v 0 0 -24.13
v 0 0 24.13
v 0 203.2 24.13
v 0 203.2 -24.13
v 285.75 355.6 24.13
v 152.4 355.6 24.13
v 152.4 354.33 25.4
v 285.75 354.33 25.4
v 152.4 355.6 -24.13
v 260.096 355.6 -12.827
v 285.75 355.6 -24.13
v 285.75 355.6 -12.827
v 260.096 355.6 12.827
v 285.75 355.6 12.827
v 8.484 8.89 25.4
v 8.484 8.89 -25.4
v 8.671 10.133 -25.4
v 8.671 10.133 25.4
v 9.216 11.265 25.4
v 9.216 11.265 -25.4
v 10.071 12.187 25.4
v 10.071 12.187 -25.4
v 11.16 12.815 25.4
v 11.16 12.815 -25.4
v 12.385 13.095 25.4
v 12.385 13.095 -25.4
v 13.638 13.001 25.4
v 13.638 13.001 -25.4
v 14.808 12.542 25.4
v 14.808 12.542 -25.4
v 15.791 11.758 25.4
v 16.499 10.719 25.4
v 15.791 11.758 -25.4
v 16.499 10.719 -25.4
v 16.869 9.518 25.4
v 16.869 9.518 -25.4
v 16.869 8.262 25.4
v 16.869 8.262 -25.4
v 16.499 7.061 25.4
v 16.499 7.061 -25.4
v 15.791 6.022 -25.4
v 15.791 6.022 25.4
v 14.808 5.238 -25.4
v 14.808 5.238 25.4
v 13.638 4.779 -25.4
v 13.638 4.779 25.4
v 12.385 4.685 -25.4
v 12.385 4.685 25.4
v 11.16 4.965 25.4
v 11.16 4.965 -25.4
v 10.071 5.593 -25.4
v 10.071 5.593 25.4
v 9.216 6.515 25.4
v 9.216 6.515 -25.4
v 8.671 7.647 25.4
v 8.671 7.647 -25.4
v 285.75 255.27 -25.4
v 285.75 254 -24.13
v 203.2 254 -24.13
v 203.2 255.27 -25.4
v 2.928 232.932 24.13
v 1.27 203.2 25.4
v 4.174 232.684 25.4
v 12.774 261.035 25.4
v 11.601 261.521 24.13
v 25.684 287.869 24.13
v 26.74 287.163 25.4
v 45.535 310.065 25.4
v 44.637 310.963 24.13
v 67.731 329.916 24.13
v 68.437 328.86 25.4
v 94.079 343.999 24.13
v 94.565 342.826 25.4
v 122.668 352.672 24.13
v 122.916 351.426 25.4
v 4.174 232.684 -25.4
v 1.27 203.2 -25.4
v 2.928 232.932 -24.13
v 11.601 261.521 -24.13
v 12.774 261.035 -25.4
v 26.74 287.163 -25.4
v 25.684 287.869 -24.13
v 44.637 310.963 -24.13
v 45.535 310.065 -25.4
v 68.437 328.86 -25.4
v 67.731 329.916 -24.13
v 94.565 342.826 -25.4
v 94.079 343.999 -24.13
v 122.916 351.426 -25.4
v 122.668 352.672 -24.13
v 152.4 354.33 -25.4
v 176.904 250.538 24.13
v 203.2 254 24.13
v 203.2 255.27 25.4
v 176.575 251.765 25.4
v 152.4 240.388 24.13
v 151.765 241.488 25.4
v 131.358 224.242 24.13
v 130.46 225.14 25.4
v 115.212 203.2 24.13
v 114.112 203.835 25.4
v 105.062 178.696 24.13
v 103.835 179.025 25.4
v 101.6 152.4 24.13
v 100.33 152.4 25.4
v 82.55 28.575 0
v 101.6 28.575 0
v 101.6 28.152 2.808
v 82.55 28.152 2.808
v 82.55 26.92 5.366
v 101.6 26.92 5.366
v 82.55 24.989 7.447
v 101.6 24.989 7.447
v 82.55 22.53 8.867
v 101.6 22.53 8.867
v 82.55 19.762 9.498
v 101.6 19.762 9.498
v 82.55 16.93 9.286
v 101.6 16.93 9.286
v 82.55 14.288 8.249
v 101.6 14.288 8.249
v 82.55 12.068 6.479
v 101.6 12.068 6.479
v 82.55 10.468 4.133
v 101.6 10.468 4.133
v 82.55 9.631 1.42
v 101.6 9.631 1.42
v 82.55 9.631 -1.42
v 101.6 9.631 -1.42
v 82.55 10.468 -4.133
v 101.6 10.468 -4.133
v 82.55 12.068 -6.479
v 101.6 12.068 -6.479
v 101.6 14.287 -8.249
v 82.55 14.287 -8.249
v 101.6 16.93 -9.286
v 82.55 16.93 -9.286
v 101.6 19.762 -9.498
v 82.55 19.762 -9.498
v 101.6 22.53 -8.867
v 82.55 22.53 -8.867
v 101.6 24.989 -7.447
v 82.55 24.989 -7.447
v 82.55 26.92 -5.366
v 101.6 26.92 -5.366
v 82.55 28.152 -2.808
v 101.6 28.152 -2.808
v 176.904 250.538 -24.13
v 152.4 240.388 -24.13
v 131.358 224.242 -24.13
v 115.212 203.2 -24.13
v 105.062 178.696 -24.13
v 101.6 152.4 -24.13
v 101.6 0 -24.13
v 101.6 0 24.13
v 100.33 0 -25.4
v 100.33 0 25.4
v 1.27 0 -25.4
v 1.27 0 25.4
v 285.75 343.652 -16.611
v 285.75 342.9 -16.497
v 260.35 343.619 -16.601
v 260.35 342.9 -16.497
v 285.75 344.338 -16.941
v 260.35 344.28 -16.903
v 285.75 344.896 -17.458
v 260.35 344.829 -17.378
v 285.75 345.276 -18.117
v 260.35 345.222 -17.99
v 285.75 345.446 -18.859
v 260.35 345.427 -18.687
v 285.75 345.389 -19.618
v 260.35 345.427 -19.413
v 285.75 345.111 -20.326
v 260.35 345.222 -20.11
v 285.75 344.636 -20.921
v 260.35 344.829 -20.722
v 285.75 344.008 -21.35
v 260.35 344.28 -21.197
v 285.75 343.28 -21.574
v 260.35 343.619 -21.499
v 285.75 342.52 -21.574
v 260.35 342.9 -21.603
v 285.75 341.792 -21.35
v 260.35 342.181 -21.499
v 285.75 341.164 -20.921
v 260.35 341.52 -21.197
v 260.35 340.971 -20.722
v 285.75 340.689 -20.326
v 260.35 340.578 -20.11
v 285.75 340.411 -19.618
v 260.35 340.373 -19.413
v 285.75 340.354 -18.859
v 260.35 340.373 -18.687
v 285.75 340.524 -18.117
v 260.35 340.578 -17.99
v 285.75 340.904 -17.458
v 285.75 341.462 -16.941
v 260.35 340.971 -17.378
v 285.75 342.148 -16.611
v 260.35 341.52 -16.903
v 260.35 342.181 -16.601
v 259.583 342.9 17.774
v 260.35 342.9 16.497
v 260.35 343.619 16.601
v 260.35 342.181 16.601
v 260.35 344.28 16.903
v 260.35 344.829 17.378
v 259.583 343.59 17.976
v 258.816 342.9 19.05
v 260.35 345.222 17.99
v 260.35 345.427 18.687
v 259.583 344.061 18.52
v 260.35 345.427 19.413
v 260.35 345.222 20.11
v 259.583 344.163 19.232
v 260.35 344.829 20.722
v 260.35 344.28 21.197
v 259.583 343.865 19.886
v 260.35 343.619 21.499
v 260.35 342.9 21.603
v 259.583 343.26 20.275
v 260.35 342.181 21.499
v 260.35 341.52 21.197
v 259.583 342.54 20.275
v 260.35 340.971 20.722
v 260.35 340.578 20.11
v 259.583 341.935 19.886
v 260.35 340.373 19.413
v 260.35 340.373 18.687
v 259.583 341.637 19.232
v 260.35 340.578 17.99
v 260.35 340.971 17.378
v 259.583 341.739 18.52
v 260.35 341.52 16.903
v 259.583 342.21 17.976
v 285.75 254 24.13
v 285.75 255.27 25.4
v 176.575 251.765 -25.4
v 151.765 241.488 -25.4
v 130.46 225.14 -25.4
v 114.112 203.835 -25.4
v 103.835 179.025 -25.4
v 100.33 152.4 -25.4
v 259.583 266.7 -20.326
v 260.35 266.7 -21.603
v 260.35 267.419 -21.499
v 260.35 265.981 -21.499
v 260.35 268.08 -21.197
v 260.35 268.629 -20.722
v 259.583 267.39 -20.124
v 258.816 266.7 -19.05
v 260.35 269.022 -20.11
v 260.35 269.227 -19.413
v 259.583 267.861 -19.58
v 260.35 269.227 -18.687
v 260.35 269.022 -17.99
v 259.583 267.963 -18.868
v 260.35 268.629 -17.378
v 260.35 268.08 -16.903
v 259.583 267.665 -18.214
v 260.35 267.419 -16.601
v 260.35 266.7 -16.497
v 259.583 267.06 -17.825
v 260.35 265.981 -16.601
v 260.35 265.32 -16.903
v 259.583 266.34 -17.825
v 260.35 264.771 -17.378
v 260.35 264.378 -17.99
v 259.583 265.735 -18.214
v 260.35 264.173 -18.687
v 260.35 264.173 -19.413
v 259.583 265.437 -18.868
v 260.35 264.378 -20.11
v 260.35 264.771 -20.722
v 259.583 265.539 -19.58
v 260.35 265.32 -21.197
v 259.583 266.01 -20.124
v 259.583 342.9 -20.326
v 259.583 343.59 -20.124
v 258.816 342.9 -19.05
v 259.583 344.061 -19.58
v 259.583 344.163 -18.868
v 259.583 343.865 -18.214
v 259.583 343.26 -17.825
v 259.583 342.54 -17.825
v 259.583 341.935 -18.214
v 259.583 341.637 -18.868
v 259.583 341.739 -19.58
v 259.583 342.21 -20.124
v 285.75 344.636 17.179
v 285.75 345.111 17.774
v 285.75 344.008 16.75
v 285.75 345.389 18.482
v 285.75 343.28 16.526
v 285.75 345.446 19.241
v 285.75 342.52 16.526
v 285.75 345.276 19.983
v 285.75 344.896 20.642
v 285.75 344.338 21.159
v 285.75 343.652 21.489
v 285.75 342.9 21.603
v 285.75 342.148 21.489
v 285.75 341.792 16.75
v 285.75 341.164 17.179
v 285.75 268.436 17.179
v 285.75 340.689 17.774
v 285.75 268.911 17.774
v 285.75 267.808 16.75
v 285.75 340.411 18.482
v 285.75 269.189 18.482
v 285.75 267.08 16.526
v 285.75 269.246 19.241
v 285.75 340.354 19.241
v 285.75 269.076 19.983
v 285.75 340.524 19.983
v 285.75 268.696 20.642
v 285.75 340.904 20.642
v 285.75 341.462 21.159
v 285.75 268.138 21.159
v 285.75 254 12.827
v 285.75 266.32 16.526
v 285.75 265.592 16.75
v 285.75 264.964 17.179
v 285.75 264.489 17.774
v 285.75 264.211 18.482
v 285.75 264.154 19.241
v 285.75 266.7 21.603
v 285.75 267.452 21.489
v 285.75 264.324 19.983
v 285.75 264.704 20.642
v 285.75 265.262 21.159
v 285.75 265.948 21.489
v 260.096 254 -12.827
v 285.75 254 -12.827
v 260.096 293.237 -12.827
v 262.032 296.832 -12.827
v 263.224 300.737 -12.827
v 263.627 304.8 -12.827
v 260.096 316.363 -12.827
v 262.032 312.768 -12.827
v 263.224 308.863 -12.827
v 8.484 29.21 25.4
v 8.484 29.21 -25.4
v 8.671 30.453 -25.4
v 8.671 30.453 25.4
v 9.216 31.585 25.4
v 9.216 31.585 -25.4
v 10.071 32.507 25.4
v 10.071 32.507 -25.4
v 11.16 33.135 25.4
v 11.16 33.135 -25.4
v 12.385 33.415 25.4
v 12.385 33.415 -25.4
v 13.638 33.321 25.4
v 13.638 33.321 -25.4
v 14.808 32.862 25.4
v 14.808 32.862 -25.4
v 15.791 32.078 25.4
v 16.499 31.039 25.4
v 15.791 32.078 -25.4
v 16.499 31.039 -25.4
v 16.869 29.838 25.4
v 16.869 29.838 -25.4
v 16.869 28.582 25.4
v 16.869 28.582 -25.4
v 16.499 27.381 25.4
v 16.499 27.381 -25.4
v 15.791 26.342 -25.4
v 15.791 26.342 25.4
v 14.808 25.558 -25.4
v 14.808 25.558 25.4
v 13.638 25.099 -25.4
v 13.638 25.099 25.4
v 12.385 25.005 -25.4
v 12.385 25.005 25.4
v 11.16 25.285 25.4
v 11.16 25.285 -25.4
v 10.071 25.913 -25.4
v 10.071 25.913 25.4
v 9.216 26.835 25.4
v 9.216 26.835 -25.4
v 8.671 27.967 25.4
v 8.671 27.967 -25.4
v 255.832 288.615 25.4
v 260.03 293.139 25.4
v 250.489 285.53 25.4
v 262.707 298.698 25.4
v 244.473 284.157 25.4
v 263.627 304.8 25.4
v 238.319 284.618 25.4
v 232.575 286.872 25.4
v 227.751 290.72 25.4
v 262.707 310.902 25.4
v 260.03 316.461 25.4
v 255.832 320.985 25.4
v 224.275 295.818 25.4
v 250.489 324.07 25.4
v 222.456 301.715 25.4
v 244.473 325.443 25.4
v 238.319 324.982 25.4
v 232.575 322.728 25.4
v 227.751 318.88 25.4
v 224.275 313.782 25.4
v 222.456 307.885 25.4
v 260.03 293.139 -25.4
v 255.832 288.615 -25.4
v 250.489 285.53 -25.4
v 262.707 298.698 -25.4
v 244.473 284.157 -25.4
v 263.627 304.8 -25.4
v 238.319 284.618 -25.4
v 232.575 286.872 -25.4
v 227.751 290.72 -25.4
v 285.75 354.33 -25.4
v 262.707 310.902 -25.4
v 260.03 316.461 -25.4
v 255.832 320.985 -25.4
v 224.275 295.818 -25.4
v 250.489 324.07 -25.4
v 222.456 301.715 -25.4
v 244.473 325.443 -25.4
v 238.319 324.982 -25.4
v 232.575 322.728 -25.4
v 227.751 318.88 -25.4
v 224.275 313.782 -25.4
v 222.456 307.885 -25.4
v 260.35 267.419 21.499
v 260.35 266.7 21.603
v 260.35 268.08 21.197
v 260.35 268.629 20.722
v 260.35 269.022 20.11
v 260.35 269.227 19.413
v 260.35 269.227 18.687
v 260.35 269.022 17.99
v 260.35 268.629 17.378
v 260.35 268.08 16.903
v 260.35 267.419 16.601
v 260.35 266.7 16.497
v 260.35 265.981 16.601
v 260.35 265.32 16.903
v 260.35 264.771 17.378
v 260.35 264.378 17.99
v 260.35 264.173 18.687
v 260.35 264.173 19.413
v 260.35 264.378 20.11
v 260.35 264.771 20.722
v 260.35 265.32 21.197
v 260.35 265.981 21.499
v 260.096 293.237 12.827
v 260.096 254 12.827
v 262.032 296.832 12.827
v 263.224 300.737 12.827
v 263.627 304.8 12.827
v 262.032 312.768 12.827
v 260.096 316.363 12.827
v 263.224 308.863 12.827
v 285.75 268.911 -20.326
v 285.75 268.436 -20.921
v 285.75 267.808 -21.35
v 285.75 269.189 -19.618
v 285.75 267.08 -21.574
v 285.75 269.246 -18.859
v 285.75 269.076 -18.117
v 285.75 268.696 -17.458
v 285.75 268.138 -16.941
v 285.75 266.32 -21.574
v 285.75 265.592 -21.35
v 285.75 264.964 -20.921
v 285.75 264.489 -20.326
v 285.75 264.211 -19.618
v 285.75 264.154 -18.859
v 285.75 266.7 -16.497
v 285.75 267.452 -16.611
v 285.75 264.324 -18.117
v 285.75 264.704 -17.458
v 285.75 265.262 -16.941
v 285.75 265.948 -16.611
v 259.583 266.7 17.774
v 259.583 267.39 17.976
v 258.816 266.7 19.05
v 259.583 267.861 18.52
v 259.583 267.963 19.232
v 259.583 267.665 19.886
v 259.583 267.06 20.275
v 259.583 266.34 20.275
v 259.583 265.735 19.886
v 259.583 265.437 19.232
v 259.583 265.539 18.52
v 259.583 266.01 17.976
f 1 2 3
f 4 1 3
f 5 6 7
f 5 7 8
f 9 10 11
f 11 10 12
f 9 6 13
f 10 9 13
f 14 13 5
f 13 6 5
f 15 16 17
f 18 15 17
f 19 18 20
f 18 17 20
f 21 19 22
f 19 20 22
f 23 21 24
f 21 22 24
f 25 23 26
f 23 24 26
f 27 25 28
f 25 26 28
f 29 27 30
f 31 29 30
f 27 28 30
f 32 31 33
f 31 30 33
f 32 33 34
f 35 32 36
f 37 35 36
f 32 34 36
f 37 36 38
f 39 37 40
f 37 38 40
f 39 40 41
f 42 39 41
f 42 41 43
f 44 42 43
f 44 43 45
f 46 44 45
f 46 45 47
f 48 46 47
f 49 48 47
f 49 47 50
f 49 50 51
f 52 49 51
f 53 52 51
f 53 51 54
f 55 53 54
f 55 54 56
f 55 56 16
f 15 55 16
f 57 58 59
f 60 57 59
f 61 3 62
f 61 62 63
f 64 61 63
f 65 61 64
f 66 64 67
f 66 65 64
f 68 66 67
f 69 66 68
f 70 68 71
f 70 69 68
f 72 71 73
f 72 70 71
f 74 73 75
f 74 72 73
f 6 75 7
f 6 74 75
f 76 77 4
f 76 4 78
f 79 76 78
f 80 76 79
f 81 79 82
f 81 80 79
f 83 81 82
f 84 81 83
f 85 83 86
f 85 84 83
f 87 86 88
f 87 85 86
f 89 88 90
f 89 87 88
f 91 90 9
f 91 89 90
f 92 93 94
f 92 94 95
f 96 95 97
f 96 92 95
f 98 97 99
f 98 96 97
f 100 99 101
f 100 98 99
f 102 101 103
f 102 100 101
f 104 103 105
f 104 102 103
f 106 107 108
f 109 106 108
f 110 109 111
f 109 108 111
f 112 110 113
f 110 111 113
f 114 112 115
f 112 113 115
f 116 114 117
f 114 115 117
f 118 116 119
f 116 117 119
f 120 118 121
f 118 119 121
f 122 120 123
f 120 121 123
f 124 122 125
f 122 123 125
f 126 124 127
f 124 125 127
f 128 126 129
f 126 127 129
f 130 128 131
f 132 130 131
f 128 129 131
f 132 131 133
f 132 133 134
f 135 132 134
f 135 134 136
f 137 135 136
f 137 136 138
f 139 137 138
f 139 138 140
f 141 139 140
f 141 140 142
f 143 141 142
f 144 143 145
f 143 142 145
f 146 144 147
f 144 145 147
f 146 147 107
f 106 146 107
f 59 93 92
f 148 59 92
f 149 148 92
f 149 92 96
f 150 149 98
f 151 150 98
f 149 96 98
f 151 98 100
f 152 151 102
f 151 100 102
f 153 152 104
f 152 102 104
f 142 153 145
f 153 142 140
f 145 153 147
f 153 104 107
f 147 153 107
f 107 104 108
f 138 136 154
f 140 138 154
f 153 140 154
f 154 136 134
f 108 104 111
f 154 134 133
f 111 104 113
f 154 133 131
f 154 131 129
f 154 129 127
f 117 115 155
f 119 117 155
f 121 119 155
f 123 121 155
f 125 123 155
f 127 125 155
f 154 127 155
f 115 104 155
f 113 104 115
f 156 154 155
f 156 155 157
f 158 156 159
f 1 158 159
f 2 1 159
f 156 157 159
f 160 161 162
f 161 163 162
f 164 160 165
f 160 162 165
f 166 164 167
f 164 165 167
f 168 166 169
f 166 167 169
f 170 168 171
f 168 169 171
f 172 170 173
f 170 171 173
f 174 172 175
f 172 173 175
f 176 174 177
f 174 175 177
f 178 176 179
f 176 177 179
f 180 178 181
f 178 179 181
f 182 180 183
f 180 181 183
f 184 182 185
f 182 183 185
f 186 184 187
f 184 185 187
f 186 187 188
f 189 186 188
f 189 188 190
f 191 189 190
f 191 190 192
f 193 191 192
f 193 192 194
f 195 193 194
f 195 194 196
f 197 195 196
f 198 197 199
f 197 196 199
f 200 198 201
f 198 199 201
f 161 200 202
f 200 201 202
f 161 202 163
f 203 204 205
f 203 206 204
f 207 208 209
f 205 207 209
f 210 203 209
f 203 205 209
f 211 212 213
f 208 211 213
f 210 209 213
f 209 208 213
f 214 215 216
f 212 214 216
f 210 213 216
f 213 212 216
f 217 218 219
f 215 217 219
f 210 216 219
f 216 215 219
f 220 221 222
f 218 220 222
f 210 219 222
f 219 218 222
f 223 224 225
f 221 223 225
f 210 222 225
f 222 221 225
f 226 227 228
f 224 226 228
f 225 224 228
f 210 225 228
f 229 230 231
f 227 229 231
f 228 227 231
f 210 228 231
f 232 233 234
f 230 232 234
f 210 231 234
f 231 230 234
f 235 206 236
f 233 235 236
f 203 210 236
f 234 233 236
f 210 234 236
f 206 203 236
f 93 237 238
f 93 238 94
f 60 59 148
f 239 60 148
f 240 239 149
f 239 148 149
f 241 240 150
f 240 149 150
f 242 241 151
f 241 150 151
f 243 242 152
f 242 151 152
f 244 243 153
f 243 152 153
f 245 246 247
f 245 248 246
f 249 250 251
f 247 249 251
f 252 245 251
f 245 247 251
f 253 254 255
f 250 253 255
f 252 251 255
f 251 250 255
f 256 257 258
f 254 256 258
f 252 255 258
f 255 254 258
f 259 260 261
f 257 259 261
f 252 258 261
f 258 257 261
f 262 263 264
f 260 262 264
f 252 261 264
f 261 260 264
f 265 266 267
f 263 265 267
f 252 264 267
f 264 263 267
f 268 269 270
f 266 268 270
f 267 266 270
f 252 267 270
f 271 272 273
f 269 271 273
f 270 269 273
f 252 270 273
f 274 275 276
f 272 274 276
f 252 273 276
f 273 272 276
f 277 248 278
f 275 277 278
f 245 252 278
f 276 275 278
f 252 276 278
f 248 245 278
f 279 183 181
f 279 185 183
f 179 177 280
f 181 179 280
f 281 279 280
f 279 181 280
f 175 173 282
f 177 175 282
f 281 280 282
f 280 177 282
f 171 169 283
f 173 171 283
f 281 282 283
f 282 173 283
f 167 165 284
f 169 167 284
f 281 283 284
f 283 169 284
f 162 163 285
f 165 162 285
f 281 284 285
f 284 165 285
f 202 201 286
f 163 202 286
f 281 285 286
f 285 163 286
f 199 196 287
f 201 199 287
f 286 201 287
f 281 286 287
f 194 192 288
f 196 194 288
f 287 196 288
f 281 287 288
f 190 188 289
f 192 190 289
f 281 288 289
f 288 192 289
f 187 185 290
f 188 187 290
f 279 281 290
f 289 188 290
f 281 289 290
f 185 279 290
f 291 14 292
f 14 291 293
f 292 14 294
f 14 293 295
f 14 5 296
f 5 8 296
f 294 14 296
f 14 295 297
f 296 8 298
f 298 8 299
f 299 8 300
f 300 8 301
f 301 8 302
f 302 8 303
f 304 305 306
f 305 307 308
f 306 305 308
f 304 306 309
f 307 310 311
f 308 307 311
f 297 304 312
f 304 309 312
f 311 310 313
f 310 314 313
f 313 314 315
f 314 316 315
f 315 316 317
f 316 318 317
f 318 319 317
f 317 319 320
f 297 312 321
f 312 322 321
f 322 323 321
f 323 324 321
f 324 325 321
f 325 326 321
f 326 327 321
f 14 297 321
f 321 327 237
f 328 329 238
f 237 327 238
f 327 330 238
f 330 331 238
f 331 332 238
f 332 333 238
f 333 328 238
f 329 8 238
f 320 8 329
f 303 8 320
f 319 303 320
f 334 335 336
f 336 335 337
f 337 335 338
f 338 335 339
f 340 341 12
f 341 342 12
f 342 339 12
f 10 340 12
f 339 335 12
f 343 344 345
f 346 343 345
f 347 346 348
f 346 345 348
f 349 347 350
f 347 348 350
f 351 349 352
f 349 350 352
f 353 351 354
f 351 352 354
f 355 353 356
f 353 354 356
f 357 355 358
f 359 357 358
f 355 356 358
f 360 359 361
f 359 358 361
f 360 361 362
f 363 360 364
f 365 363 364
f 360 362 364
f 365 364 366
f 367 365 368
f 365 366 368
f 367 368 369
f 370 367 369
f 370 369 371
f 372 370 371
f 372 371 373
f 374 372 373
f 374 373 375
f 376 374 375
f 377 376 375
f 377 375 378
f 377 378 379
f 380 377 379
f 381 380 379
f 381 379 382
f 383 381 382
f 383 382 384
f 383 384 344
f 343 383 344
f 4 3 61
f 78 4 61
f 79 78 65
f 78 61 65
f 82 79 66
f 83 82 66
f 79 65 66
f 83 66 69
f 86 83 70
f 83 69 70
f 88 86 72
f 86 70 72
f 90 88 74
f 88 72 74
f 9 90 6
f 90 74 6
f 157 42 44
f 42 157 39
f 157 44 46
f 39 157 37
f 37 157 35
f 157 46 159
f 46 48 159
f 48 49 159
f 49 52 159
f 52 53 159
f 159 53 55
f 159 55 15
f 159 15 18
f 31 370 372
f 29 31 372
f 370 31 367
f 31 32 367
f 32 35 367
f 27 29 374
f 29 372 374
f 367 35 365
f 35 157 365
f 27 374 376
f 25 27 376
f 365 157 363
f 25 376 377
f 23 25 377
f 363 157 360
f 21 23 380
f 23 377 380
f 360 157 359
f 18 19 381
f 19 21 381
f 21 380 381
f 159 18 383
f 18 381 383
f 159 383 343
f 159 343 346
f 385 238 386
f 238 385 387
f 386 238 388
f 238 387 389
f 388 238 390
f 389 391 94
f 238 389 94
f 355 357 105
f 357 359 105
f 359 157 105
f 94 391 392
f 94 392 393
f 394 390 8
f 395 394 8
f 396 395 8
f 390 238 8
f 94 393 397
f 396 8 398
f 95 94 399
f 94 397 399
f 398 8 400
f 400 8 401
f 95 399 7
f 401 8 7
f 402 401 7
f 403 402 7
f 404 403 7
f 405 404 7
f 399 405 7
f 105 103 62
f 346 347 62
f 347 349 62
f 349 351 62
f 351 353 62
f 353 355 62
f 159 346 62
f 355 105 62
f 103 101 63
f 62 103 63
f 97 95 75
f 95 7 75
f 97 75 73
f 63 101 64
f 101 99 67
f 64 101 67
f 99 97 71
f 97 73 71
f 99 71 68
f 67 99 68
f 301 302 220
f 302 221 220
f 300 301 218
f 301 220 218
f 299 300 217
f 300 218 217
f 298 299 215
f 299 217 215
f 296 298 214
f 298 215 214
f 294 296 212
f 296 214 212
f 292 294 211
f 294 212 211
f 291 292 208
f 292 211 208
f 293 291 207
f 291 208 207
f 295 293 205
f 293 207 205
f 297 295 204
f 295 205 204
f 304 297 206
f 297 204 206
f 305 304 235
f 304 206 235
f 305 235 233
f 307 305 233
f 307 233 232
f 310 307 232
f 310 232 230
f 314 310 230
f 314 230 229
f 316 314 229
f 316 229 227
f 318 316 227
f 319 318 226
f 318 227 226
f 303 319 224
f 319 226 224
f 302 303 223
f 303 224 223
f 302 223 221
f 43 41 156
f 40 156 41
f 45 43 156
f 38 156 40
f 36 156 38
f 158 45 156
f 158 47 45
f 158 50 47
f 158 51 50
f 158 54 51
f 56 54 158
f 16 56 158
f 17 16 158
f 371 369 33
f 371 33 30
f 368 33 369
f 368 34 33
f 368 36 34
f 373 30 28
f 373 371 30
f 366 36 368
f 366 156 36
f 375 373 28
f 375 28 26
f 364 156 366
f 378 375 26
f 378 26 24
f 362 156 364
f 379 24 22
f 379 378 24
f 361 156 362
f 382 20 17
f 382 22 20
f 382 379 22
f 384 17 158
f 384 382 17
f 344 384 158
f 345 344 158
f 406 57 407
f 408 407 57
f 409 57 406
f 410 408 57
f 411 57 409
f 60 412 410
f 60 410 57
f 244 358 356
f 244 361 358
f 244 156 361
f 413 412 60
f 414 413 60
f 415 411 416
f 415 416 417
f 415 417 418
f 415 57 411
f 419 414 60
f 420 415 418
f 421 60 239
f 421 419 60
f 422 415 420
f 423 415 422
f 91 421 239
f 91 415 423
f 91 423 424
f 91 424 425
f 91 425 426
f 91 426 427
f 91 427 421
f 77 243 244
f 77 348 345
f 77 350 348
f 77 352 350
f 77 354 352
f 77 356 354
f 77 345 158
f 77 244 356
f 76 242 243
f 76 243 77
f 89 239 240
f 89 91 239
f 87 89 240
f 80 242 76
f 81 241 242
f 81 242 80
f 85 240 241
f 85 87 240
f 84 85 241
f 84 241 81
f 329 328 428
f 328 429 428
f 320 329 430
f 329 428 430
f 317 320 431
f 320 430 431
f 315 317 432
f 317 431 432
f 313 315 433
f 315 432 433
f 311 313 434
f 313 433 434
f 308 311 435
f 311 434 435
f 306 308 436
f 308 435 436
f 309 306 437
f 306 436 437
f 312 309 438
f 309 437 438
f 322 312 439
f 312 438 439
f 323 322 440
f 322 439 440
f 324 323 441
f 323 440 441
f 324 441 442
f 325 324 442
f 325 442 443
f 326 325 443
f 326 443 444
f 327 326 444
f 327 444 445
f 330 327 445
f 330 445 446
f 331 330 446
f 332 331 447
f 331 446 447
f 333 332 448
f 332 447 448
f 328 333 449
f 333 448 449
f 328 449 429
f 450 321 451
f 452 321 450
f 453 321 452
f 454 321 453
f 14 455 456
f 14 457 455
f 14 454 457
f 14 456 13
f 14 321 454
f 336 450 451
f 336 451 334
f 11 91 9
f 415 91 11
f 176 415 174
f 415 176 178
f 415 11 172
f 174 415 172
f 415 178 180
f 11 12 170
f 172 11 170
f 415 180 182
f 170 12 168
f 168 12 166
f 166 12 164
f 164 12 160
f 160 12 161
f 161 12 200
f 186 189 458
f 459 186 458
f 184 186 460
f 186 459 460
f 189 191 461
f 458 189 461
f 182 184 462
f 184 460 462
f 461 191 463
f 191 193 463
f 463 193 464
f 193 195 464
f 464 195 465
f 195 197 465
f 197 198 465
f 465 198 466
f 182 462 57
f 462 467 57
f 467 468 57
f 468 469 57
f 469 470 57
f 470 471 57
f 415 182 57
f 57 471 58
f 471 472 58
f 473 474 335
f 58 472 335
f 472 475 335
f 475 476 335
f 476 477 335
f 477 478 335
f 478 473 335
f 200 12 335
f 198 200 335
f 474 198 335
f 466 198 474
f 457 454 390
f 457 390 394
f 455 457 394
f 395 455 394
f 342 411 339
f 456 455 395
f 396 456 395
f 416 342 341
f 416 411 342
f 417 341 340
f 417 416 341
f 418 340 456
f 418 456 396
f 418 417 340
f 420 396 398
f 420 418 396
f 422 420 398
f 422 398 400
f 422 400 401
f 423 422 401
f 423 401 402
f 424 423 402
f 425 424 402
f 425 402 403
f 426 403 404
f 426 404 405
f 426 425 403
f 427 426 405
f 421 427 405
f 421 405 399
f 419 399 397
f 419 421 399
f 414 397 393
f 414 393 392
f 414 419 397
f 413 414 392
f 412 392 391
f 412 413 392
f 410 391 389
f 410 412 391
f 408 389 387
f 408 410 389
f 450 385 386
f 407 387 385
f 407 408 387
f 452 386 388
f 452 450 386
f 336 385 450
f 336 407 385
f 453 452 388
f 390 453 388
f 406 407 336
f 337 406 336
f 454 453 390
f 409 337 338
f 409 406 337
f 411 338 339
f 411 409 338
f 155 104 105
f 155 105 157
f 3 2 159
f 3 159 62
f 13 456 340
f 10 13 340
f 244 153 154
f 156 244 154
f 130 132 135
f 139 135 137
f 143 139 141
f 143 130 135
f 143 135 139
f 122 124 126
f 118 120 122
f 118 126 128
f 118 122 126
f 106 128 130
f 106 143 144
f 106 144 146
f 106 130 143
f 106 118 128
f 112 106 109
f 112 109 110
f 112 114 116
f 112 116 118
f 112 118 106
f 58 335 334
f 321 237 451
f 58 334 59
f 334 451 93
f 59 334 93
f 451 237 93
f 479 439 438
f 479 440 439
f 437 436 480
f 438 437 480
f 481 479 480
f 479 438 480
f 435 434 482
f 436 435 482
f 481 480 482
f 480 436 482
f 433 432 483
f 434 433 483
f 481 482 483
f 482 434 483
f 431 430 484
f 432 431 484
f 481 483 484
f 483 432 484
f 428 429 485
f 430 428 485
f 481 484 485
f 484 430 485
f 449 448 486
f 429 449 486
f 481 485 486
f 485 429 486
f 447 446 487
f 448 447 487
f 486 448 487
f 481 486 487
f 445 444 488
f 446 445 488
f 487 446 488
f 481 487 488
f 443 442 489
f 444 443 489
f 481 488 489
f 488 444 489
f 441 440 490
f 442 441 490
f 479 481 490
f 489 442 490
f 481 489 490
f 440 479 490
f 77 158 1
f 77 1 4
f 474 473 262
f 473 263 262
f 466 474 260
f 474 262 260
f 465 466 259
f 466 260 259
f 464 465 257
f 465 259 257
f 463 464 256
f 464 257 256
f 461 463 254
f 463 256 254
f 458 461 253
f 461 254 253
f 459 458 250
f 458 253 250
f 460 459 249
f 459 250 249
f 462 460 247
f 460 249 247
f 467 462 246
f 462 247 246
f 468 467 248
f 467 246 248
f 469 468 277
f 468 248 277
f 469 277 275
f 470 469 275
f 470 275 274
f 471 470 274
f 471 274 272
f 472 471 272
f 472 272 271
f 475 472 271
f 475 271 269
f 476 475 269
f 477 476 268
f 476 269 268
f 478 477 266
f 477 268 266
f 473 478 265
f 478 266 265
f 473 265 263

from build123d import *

# Parameters (mm, degrees)
SKETCH1_R                   = 20.701
BOSS_EXTRUDE1_DEPTH         = 25.4
SKETCH2_W                   = 25.654
SKETCH2_H                   = 101.6
CUT_EXTRUDE1_DEPTH          = 25.654
F_1_4_20_TAPPED_HOLE1_D     = 5.1054
F_1_4_20_TAPPED_HOLE1_DEPTH = 25.4
F_1_4_20_TAPPED_HOLE1_TIP   = 1.533816902
F_3_8_24_TAPPED_HOLE1_D     = 8.4328
SKETCH10_R                  = 9.525
CUT_EXTRUDE2_DEPTH          = 19.05
CHAMFER1_SIZE               = 1.27


with BuildPart() as part:
    # Sketch1 → Boss-Extrude1 (new, symmetric)
    with BuildSketch(Plane.XY):
        with BuildLine():
            Line((0, 0), (0, 203.2))
            ThreePointArc((0, 203.2), (44.636926547, 310.963073453), (152.4, 355.6))
            Line((152.4, 355.6), (285.75, 355.6))
            Line((285.75, 355.6), (285.75, 254))
            Line((285.75, 254), (203.2, 254))
            ThreePointArc((203.2, 254), (131.357951031, 224.242048969), (101.6, 152.4))
            Line((101.6, 152.4), (101.6, 0))
            Line((101.6, 0), (0, 0))
        make_face()
        with Locations((242.9256, 304.8)):
            Circle(SKETCH1_R, mode=Mode.SUBTRACT)
    extrude(amount=BOSS_EXTRUDE1_DEPTH, both=True)

    # Sketch2 → Cut-Extrude1 (cut)
    with BuildSketch(Plane(origin=(285.75, 0, 0), x_dir=(0, 0, -1), z_dir=(1, 0, 0))):
        with Locations((0, 304.8)):
            Rectangle(SKETCH2_W, SKETCH2_H)
    extrude(amount=-CUT_EXTRUDE1_DEPTH, mode=Mode.SUBTRACT)

    # 1/4-20 Tapped Hole1
    with Locations(Plane(origin=(285.75, 0, 0), x_dir=(0, 0, -1), z_dir=(1, 0, 0))):
        with Locations((19.05, 342.9), (-19.05, 342.9), (-19.05, 266.7), (19.05, 266.7)):
            Hole(F_1_4_20_TAPPED_HOLE1_D / 2, depth=F_1_4_20_TAPPED_HOLE1_DEPTH)
            with Locations((0, 0, -(F_1_4_20_TAPPED_HOLE1_DEPTH + F_1_4_20_TAPPED_HOLE1_TIP / 2))):  # 118° drill point
                Cone(0, F_1_4_20_TAPPED_HOLE1_D / 2, F_1_4_20_TAPPED_HOLE1_TIP, mode=Mode.SUBTRACT)

    # 3/8-24 Tapped Hole1 (through all)
    with Locations(Plane.XY.offset(25.4)):
        with Locations((12.7, 29.21), (12.7, 8.89)):
            Hole(F_3_8_24_TAPPED_HOLE1_D / 2)

    # Sketch10 → Cut-Extrude2 (cut)
    with BuildSketch(Plane(origin=(101.6, 0, 0), x_dir=(0, 0, -1), z_dir=(1, 0, 0))):
        with Locations(Location((0, 19.05, 0), (0, 0, 90))):
            Circle(SKETCH10_R)
    extrude(amount=-CUT_EXTRUDE2_DEPTH, mode=Mode.SUBTRACT)

    # Chamfer1
    chamfer1_edges = [part.edges().sort_by_distance(p)[0] for p in [
        (244.475, 254, -25.4),
        (131.357951031, 224.242048969, -25.4),
        (101.6, 76.2, -25.4),
        (131.357951031, 224.242048969, 25.4),
        (244.475, 254, 25.4),
        (219.075, 355.6, 25.4),
        (44.636926547, 310.963073453, 25.4),
        (0, 101.6, 25.4),
        (0, 101.6, -25.4),
        (101.6, 76.2, 25.4),
        (44.636926547, 310.963073453, -25.4),
        (219.075, 355.6, -25.4),
    ]]
    chamfer(chamfer1_edges, length=CHAMFER1_SIZE)


solid = part.part
